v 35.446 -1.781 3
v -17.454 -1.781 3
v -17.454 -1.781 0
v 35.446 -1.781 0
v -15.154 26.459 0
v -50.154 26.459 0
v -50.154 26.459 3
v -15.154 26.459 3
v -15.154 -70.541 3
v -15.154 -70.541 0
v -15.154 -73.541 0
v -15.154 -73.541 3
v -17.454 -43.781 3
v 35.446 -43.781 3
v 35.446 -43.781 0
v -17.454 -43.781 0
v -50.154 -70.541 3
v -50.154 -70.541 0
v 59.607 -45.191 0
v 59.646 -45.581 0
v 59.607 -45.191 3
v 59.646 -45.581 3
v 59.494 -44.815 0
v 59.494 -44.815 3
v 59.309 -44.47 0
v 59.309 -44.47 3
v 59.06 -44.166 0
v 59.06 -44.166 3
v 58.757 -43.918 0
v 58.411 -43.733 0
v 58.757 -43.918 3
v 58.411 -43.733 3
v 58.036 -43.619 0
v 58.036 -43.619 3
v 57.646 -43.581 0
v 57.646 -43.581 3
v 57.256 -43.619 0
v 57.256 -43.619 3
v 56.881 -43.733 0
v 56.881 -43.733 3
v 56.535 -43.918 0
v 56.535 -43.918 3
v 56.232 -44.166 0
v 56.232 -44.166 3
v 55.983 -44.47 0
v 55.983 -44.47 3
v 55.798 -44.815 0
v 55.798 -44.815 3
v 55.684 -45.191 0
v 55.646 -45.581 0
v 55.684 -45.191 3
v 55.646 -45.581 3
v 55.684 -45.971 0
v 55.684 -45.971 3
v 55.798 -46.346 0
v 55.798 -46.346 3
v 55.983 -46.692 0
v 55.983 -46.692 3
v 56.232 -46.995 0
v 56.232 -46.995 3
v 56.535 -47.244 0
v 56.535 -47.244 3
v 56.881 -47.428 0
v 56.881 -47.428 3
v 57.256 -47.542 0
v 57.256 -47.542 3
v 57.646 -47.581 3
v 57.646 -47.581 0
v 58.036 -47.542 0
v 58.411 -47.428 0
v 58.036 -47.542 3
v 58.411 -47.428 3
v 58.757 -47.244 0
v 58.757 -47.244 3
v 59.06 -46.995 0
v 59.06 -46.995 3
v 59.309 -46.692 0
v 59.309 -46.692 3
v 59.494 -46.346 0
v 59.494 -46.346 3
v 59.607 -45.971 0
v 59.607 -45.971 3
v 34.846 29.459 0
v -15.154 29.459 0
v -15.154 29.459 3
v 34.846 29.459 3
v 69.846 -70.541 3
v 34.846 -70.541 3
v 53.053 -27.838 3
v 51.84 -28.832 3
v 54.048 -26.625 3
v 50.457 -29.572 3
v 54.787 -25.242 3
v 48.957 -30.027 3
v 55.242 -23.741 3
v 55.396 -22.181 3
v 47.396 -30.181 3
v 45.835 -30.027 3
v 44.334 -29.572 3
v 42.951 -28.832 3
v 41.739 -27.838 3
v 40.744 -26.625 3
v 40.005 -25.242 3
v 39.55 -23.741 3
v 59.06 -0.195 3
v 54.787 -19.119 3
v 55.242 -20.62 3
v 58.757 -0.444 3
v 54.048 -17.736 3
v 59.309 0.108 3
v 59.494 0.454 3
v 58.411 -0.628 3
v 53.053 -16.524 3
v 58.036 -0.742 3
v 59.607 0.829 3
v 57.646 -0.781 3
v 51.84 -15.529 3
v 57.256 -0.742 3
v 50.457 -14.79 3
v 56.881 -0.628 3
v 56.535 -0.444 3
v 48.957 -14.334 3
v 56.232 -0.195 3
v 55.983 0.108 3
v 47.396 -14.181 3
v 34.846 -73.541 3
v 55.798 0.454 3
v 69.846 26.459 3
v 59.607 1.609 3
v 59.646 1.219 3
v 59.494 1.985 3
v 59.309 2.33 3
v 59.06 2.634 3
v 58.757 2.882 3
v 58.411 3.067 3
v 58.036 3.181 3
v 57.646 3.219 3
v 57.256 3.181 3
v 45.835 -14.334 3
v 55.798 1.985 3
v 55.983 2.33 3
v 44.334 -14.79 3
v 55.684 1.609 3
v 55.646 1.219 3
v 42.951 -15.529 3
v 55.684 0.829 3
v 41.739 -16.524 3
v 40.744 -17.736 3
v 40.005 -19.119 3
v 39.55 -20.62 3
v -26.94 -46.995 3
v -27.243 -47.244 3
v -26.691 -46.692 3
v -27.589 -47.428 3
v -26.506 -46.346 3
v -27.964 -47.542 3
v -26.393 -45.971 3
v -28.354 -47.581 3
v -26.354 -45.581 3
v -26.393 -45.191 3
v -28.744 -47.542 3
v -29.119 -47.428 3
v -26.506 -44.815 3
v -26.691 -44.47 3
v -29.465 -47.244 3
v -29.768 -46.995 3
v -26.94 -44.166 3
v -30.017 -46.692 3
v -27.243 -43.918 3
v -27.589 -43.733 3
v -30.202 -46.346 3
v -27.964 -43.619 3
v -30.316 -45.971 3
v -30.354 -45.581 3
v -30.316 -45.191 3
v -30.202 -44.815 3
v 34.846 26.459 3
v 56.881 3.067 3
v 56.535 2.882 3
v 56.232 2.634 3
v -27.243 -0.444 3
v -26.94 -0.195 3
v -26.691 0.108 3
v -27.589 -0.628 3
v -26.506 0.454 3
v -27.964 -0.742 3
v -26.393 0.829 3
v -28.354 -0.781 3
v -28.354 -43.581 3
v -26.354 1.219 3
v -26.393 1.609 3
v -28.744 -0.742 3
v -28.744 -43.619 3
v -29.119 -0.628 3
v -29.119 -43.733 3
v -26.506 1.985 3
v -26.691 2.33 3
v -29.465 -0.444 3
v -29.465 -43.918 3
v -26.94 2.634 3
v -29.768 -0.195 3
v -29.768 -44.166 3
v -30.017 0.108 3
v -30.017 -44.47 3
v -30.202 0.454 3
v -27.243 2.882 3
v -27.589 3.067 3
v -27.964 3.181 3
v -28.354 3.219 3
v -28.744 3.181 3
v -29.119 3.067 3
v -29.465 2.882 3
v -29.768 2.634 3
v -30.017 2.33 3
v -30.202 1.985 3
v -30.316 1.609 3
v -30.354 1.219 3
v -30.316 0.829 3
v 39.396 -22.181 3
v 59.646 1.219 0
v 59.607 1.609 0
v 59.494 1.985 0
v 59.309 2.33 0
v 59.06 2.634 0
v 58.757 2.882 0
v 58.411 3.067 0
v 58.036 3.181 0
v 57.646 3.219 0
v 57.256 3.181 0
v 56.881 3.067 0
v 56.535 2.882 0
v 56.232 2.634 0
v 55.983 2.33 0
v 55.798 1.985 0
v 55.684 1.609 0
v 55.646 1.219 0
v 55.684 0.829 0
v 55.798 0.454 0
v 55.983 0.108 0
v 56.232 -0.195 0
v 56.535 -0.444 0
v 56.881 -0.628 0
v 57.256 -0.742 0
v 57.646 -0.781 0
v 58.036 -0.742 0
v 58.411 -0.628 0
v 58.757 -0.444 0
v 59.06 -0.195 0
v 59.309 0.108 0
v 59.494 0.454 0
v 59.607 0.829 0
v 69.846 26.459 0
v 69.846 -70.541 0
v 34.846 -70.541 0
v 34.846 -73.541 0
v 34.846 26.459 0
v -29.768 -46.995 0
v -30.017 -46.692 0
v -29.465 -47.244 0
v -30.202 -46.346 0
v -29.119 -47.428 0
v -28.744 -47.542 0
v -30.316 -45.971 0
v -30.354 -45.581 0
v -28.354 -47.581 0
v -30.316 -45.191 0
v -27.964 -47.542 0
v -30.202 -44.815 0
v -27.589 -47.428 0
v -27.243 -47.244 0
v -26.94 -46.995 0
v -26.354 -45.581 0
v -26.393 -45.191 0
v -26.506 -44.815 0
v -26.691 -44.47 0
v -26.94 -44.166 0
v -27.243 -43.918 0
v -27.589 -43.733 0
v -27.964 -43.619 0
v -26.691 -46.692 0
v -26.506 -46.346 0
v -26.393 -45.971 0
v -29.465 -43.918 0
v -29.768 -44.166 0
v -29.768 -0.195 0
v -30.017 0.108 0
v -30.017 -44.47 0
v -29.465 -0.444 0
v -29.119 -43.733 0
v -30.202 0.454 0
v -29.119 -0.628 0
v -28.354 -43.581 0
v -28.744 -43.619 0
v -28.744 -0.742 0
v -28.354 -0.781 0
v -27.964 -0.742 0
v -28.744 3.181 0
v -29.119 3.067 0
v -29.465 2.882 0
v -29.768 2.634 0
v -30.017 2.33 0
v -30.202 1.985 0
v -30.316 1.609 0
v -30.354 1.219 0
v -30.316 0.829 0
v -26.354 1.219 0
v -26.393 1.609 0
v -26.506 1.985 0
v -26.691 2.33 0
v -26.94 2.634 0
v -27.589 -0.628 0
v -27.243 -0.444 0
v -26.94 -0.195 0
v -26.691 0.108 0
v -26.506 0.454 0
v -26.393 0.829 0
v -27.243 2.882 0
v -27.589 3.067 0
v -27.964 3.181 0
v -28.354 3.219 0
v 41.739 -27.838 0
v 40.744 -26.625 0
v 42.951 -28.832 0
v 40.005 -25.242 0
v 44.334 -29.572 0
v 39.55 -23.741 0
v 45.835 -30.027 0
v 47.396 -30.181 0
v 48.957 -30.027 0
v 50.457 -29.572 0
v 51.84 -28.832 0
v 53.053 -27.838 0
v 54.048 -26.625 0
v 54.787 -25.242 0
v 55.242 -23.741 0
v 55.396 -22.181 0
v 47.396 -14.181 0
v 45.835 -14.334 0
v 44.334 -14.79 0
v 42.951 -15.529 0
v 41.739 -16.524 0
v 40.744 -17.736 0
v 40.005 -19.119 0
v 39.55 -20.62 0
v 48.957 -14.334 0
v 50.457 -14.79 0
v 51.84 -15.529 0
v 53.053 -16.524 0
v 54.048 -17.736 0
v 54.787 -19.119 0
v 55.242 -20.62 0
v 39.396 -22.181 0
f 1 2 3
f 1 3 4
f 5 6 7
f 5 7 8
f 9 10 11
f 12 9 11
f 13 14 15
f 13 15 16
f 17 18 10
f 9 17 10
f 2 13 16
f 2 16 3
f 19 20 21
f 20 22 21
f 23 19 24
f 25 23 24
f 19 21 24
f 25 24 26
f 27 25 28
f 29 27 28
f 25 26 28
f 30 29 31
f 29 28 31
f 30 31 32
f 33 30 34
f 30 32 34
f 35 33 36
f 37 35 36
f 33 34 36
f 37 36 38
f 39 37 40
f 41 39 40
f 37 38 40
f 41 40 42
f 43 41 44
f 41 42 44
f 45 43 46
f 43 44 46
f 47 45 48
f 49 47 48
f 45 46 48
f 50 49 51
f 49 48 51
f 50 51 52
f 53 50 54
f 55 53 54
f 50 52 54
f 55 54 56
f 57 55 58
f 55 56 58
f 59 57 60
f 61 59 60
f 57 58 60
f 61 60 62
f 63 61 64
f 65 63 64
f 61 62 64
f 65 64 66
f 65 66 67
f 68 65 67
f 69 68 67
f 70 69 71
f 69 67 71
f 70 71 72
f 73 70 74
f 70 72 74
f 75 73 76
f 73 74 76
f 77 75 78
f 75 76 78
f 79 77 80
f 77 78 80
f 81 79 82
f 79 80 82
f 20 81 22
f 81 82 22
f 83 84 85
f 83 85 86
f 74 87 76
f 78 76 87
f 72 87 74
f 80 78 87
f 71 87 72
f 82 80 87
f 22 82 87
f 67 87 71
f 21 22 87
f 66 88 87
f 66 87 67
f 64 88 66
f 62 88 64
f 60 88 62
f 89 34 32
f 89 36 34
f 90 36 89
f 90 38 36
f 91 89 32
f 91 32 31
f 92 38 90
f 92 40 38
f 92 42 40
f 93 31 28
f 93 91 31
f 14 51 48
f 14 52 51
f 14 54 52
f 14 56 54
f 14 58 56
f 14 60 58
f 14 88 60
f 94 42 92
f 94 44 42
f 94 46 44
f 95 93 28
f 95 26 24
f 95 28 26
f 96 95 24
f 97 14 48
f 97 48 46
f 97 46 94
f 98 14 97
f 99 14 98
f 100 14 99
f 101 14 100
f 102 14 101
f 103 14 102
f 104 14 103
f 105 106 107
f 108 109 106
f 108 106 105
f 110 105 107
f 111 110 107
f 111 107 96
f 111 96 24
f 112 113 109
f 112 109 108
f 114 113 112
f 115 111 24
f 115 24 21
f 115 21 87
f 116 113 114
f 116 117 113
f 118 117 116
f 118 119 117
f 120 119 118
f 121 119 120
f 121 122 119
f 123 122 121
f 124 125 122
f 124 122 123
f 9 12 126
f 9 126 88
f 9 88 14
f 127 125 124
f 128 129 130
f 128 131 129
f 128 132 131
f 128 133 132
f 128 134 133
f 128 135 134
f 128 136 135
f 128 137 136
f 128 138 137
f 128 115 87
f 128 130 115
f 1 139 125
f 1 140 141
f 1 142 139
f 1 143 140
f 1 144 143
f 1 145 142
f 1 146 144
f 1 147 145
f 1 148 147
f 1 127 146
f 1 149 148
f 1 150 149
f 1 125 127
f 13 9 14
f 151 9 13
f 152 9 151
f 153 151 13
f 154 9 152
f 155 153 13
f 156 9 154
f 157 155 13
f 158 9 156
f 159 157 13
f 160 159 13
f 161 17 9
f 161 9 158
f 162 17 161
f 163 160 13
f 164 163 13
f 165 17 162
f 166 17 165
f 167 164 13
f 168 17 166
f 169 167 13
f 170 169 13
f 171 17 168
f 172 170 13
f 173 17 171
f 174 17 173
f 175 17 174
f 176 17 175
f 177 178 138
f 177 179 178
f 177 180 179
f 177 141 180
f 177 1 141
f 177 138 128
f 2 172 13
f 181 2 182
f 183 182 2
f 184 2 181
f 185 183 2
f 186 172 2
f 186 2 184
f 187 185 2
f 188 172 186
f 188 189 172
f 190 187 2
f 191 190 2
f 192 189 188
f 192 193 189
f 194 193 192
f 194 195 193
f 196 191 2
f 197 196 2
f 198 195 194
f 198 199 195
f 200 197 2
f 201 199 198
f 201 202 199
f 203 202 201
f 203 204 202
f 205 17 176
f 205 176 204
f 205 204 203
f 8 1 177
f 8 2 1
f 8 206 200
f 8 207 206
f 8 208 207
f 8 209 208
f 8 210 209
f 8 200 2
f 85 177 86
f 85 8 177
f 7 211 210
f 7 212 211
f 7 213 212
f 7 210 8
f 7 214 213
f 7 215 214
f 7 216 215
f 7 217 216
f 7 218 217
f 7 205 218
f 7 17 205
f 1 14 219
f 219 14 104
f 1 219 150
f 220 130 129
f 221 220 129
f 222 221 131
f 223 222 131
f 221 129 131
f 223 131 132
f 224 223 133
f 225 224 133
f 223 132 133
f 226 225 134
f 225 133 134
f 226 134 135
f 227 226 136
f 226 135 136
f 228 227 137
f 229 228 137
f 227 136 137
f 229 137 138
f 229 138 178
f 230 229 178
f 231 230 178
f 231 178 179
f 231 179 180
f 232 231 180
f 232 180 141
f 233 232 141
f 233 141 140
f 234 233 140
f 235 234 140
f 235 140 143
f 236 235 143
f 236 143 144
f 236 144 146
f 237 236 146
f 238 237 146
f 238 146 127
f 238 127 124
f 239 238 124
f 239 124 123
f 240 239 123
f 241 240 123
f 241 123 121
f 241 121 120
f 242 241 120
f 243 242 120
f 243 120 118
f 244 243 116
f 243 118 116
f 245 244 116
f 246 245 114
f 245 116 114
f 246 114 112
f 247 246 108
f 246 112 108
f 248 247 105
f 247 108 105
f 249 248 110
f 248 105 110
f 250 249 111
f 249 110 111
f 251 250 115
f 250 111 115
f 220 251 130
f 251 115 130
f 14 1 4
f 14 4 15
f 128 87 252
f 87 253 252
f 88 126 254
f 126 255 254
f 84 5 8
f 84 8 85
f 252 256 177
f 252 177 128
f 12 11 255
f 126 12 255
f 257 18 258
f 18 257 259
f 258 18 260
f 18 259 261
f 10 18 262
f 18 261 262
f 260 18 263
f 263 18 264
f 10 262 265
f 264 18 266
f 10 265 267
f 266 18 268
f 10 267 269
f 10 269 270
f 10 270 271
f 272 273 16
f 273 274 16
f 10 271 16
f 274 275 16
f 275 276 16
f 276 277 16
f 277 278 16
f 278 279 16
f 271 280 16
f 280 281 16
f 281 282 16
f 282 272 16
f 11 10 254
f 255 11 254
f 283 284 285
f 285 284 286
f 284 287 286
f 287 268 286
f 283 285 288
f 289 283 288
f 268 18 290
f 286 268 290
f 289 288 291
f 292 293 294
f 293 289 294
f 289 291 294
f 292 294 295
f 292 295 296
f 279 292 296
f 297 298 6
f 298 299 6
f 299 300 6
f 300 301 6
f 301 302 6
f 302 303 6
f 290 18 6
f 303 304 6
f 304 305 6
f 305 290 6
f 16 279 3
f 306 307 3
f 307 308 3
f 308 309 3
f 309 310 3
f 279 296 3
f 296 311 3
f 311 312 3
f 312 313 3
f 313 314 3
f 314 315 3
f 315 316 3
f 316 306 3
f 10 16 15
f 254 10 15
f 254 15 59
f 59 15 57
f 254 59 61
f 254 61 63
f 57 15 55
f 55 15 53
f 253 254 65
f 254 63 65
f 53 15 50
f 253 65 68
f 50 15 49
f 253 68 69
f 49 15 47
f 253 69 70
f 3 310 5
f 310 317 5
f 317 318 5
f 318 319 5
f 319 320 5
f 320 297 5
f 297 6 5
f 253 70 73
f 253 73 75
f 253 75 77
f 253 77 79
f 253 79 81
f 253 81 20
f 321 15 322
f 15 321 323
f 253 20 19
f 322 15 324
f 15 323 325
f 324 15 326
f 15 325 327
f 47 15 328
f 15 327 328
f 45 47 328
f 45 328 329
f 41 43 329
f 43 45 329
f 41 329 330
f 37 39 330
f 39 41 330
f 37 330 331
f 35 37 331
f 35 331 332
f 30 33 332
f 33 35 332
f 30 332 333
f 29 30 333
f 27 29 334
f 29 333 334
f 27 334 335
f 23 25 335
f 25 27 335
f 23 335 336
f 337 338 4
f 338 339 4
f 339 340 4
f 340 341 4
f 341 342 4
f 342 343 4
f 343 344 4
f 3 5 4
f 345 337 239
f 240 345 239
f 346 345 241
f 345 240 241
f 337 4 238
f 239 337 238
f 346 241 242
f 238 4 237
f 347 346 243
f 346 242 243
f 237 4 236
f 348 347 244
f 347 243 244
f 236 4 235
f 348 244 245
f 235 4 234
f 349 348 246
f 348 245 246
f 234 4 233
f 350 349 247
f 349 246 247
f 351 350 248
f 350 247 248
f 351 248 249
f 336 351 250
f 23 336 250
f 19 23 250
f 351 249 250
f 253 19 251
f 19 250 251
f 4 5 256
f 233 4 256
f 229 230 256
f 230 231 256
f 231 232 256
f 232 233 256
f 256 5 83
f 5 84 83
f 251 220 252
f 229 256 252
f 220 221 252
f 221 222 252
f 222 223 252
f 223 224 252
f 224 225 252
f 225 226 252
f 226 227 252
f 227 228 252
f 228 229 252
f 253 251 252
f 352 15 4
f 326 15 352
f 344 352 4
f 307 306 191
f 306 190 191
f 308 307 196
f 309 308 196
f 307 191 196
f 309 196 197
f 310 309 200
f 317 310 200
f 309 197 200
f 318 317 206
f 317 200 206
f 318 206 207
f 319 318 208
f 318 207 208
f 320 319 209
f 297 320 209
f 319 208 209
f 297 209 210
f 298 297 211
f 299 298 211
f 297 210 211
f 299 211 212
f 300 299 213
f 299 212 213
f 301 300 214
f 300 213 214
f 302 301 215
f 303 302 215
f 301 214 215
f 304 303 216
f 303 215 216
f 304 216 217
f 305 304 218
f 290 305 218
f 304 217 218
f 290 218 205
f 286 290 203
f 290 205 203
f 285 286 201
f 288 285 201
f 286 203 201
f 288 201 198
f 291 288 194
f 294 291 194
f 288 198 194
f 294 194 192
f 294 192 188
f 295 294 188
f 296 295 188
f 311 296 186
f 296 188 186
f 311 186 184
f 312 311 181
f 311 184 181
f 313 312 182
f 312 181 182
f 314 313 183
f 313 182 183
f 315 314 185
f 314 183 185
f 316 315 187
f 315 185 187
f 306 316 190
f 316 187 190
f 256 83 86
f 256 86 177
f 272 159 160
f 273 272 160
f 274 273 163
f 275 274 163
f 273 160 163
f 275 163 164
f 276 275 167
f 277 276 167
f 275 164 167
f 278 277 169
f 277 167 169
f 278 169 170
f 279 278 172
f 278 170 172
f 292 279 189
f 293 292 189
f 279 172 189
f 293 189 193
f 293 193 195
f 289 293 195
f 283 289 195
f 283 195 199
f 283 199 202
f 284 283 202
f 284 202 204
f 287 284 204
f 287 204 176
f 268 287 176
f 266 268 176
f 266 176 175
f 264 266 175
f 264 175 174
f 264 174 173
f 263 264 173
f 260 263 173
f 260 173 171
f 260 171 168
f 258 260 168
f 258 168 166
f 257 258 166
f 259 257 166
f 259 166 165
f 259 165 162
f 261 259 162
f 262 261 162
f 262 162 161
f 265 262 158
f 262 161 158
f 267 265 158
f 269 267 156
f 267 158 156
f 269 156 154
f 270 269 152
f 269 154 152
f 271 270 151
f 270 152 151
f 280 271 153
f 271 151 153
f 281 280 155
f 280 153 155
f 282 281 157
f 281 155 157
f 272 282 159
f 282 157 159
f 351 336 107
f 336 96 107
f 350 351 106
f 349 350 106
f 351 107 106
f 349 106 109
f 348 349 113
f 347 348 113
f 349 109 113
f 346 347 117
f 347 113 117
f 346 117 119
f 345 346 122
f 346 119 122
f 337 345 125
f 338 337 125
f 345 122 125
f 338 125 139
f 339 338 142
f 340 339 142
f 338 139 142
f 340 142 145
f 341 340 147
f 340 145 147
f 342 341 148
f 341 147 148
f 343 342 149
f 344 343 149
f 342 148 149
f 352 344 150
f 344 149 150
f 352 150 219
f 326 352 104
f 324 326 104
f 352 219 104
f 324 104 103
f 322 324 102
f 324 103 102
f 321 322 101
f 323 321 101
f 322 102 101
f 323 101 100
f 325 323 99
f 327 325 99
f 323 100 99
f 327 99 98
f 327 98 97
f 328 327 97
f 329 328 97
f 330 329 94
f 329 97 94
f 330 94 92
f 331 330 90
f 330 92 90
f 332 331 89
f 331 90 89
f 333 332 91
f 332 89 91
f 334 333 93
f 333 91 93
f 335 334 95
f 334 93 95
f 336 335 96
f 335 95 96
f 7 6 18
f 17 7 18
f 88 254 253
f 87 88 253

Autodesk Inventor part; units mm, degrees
ref_plane "YZ Plane" through (0, 0, 0) normal (1, 0, 0) x (0, 1, 0)
ref_plane "XZ Plane" through (0, 0, 0) normal (0, 1, 0) x (-1, 0, 0)
ref_plane "XY Plane" through (0, 0, 0) normal (0, 0, 1) x (1, 0, 0)
sketch "Sketch2" plane through (0, 0, 0) normal (0, 0, 1) x (1, 0, 0)
  line L0 (-50.1541, 26.4593) -> (-15.1541, 26.4593)
  line L1 (-15.1541, 26.4593) -> (-15.1541, 29.4593)
  line L2 (-15.1541, 29.4593) -> (34.8459, 29.4593)
  line L3 (34.8459, 29.4593) -> (34.8459, 26.4593)
  line L4 (34.8459, 26.4593) -> (69.8459, 26.4593)
  line L5 (-50.1541, 26.4593) -> (-50.1541, -70.5407)
  line L6 (-50.1541, -70.5407) -> (-15.1541, -70.5407)
  line L7 (-15.1541, -70.5407) -> (-15.1541, -73.5407)
  line L8 (-15.1541, -73.5407) -> (34.8459, -73.5407)
  line L9 (34.8459, -73.5407) -> (34.8459, -70.5407)
  line L10 (34.8459, -70.5407) -> (69.8459, -70.5407)
  line L11 (69.8459, -70.5407) -> (69.8459, 26.4593)
  point P0 (0, 0)
  dimension "d0" = 3
  dimension "d1" = 50
  dimension "d2" = 35
  dimension "d3" = 35
  dimension "d4" = 97
  dimension "d5" = 97
  dimension "d6" = 3
  dimension "d7" = 35
  dimension "d8" = 50
  dimension "d9" = 35
extrude "Extrusion1" add sketch "Sketch2" along normal blind 3
sketch "Sketch3" plane through (0, 0, 3) normal (0, 0, 1) x (1, 0, 0)
  line L0 (34.8459, 29.4593) -> (-15.1541, 29.4593) projected
  line L1 (-15.1541, -73.5407) -> (34.8459, -73.5407) projected
  line L2 (-50.1541, 26.4593) -> (-50.1541, -70.5407) projected
  line L3 (69.8459, -70.5407) -> (69.8459, 26.4593) projected
  circle A0 centre (57.6459, 1.2193) radius 2
  circle A1 centre (57.6459, -45.5807) radius 2
  circle A2 centre (-28.3541, 1.2193) radius 2
  circle A3 centre (-28.3541, -45.5807) radius 2
  circle A4 centre (47.3959, -22.1807) radius 7
  line L4 (-16.4541, -2.7807) -> (34.4459, -2.7807)
  line L5 (34.4459, -2.7807) -> (34.4459, -42.7807)
  line L6 (34.4459, -42.7807) -> (-16.4541, -42.7807)
  line L7 (-16.4541, -42.7807) -> (-16.4541, -2.7807)
  line L8 (-38.3241, -7.0307) -> (-31.4241, -7.0307)
  line L9 (-31.4241, -7.0307) -> (-31.4241, -37.4307)
  line L10 (-31.4241, -37.4307) -> (-38.3241, -37.4307)
  line L11 (-38.3241, -37.4307) -> (-38.3241, -7.0307)
  point P0 (0, 0)
  dimension "d30" = 4
  dimension "d34" = 4
  dimension "d35" = 4
  dimension "d36" = 4
  dimension "d38" = 14
  dimension "d43" = 50.9
  dimension "d44" = 40
extrude "Extrusion2" cut sketch "Sketch3" against normal blind 10
sketch "Sketch4" plane through (-38.3241, -37.4307, 3) normal (1, 0, 0) x (0, 0, -1)
  line L0 (0, 30.4) -> (3, 30.4)
  line L1 (3, 30.4) -> (3, 0)
  line L2 (3, 0) -> (0, 0)
  line L3 (0, 0) -> (0, 30.4)
  point P0 (3, 37.4307)
extrude "Extrusion3" add sketch "Sketch4" along normal blind 10
sketch "Sketch5" plane through (0, 0, 3) normal (0, 0, 1) x (1, 0, 0)
  circle A0 centre (47.3959, -22.1807) radius 7 projected
  circle A1 centre (47.3959, -22.1807) radius 8
  line L0 (-16.4541, -2.7807) -> (34.4459, -2.7807) projected
  line L1 (34.4459, -42.7807) -> (-16.4541, -42.7807) projected
  line L2 (35.4459, -43.7807) -> (-17.4541, -43.7807)
  line L3 (-17.4541, -43.7807) -> (-17.4541, -1.7807)
  line L4 (-17.4541, -1.7807) -> (35.4459, -1.7807)
  line L5 (35.4459, -1.7807) -> (35.4459, -43.7807)
  point P0 (0, 0)
extrude "Extrusion4" cut sketch "Sketch5" against normal blind 10 contours A0 | A1 | L2 L3 L4 L5
sketch "Sketch6" plane through (0, 0, 3) normal (0, 0, 1) x (1, 0, 0)
  point P0 (0, 0)
sketch "Sketch7" plane through (0, 0, 3) normal (0, 0, 1) x (1, 0, 0)
  point P0 (0, 0)
sketch "Sketch8" plane through (0, 0, 3) normal (0, 0, 1) x (1, 0, 0)
  point P0 (0, 0)
properties part number "Level2-3 (GLCD)"
